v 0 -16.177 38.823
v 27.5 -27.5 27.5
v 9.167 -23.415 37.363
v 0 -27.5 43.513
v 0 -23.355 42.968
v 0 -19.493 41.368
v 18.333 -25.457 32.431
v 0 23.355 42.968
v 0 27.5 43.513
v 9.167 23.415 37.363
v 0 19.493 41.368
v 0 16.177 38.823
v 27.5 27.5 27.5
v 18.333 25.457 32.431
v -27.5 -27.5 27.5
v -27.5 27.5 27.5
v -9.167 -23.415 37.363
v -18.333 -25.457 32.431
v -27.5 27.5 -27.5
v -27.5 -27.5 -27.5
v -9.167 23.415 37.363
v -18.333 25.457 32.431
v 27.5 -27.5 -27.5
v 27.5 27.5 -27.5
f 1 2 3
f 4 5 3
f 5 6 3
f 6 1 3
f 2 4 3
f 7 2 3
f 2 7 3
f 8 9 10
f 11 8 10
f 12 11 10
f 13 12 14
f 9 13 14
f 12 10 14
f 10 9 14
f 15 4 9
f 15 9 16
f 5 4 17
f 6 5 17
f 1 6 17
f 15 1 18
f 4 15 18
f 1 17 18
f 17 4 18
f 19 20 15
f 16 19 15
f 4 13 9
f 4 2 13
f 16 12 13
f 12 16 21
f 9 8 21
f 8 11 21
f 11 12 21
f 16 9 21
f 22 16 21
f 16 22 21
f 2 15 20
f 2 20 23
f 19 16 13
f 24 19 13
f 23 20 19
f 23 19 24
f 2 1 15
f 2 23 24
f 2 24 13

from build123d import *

# Parameters (mm, degrees)
F0_W     = 55
F0_H     = 55
F1_DEPTH = 27.5
F4_DEPTH = 27.5
F6_ANGLE = 45
F8_ANGLE = 45


with BuildPart() as f1:
    # F0 (on Front) → F1 (new body, symmetric)
    with BuildSketch(Plane.XZ):
        Rectangle(F0_W, F0_H)
    extrude(amount=F1_DEPTH, both=True)

    # F3 (on Front) → F4 (join, symmetric)
    with BuildSketch(Plane.XZ):
        Polygon((27.5, 27.5), (0, 43.5133390129), (-27.5, 27.5), align=None)
    extrude(amount=F4_DEPTH, both=True)

    # F5 (on face) → F6 (revolve, cut)
    with BuildSketch(Plane.XZ.offset(27.5)):
        Polygon((0, 43.5133390129), (-27.5, 27.5), (27.5, 27.5), align=None)
    revolve(axis=Axis((0, -27.5, 27.5), (-1, 0, 0)), revolution_arc=F6_ANGLE, mode=Mode.SUBTRACT)

    # F7 (on face) → F8 (revolve, cut)
    with BuildSketch(Plane(origin=(0, 27.5, 0), x_dir=(-1, 0, 0), z_dir=(0, 1, 0))):
        Polygon((0, 43.5133390129), (-27.5, 27.5), (27.5, 27.5), align=None)
    revolve(axis=Axis((0, 27.5, 27.5), (1, 0, 0)), revolution_arc=F8_ANGLE, mode=Mode.SUBTRACT)


solid = f1.part
